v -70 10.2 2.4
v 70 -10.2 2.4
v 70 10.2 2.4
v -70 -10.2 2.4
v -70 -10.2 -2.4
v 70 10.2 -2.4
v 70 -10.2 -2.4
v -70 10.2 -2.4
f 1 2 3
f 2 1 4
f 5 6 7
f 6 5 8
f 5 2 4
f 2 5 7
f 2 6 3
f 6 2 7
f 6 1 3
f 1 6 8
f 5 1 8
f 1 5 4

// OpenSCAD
// file: ../configurations/global.scad
SHOW_FLOPPY_DRIVE = true;
SHOW_BUTTON_ASSETS = true;
SHOW_HOLDER_PIECE = true;
SHOW_8266_FIXATION = true;


symfloppy_box_x_size = 140;
symfloppy_box_y_size = 200;
symfloppy_box_z_size = 30;
symfloppy_box_pane_thickness = 4.8;


button_y_front_offset = 15;
button_x_spaces = 18;
button_x_center_offset = -25;


holder_piece_x_from_z_offset = 5;
holder_piece_y_centered_holder_piece_gap = 120;
// file: subpieces/centeredPaneSubPiece.scad
module centeredPaneSubPiece(x_size, y_size, z_size) {
    cube(
        [
            x_size,
            y_size,
            z_size,
        ],
        center = true
    );
}
// main file
use <./subpieces/centeredPaneSubPiece.scad>
include <../configurations/global.scad>

frontPanePiece();

module frontPanePiece(
    x_size = symfloppy_box_x_size,
    y_size = symfloppy_box_z_size - symfloppy_box_pane_thickness * 2,
    pane_thickness = symfloppy_box_pane_thickness
) {
    echo("frontPanePiece", x_size=x_size, y_size=y_size);
    centeredPaneSubPiece(x_size, y_size, pane_thickness);
}
